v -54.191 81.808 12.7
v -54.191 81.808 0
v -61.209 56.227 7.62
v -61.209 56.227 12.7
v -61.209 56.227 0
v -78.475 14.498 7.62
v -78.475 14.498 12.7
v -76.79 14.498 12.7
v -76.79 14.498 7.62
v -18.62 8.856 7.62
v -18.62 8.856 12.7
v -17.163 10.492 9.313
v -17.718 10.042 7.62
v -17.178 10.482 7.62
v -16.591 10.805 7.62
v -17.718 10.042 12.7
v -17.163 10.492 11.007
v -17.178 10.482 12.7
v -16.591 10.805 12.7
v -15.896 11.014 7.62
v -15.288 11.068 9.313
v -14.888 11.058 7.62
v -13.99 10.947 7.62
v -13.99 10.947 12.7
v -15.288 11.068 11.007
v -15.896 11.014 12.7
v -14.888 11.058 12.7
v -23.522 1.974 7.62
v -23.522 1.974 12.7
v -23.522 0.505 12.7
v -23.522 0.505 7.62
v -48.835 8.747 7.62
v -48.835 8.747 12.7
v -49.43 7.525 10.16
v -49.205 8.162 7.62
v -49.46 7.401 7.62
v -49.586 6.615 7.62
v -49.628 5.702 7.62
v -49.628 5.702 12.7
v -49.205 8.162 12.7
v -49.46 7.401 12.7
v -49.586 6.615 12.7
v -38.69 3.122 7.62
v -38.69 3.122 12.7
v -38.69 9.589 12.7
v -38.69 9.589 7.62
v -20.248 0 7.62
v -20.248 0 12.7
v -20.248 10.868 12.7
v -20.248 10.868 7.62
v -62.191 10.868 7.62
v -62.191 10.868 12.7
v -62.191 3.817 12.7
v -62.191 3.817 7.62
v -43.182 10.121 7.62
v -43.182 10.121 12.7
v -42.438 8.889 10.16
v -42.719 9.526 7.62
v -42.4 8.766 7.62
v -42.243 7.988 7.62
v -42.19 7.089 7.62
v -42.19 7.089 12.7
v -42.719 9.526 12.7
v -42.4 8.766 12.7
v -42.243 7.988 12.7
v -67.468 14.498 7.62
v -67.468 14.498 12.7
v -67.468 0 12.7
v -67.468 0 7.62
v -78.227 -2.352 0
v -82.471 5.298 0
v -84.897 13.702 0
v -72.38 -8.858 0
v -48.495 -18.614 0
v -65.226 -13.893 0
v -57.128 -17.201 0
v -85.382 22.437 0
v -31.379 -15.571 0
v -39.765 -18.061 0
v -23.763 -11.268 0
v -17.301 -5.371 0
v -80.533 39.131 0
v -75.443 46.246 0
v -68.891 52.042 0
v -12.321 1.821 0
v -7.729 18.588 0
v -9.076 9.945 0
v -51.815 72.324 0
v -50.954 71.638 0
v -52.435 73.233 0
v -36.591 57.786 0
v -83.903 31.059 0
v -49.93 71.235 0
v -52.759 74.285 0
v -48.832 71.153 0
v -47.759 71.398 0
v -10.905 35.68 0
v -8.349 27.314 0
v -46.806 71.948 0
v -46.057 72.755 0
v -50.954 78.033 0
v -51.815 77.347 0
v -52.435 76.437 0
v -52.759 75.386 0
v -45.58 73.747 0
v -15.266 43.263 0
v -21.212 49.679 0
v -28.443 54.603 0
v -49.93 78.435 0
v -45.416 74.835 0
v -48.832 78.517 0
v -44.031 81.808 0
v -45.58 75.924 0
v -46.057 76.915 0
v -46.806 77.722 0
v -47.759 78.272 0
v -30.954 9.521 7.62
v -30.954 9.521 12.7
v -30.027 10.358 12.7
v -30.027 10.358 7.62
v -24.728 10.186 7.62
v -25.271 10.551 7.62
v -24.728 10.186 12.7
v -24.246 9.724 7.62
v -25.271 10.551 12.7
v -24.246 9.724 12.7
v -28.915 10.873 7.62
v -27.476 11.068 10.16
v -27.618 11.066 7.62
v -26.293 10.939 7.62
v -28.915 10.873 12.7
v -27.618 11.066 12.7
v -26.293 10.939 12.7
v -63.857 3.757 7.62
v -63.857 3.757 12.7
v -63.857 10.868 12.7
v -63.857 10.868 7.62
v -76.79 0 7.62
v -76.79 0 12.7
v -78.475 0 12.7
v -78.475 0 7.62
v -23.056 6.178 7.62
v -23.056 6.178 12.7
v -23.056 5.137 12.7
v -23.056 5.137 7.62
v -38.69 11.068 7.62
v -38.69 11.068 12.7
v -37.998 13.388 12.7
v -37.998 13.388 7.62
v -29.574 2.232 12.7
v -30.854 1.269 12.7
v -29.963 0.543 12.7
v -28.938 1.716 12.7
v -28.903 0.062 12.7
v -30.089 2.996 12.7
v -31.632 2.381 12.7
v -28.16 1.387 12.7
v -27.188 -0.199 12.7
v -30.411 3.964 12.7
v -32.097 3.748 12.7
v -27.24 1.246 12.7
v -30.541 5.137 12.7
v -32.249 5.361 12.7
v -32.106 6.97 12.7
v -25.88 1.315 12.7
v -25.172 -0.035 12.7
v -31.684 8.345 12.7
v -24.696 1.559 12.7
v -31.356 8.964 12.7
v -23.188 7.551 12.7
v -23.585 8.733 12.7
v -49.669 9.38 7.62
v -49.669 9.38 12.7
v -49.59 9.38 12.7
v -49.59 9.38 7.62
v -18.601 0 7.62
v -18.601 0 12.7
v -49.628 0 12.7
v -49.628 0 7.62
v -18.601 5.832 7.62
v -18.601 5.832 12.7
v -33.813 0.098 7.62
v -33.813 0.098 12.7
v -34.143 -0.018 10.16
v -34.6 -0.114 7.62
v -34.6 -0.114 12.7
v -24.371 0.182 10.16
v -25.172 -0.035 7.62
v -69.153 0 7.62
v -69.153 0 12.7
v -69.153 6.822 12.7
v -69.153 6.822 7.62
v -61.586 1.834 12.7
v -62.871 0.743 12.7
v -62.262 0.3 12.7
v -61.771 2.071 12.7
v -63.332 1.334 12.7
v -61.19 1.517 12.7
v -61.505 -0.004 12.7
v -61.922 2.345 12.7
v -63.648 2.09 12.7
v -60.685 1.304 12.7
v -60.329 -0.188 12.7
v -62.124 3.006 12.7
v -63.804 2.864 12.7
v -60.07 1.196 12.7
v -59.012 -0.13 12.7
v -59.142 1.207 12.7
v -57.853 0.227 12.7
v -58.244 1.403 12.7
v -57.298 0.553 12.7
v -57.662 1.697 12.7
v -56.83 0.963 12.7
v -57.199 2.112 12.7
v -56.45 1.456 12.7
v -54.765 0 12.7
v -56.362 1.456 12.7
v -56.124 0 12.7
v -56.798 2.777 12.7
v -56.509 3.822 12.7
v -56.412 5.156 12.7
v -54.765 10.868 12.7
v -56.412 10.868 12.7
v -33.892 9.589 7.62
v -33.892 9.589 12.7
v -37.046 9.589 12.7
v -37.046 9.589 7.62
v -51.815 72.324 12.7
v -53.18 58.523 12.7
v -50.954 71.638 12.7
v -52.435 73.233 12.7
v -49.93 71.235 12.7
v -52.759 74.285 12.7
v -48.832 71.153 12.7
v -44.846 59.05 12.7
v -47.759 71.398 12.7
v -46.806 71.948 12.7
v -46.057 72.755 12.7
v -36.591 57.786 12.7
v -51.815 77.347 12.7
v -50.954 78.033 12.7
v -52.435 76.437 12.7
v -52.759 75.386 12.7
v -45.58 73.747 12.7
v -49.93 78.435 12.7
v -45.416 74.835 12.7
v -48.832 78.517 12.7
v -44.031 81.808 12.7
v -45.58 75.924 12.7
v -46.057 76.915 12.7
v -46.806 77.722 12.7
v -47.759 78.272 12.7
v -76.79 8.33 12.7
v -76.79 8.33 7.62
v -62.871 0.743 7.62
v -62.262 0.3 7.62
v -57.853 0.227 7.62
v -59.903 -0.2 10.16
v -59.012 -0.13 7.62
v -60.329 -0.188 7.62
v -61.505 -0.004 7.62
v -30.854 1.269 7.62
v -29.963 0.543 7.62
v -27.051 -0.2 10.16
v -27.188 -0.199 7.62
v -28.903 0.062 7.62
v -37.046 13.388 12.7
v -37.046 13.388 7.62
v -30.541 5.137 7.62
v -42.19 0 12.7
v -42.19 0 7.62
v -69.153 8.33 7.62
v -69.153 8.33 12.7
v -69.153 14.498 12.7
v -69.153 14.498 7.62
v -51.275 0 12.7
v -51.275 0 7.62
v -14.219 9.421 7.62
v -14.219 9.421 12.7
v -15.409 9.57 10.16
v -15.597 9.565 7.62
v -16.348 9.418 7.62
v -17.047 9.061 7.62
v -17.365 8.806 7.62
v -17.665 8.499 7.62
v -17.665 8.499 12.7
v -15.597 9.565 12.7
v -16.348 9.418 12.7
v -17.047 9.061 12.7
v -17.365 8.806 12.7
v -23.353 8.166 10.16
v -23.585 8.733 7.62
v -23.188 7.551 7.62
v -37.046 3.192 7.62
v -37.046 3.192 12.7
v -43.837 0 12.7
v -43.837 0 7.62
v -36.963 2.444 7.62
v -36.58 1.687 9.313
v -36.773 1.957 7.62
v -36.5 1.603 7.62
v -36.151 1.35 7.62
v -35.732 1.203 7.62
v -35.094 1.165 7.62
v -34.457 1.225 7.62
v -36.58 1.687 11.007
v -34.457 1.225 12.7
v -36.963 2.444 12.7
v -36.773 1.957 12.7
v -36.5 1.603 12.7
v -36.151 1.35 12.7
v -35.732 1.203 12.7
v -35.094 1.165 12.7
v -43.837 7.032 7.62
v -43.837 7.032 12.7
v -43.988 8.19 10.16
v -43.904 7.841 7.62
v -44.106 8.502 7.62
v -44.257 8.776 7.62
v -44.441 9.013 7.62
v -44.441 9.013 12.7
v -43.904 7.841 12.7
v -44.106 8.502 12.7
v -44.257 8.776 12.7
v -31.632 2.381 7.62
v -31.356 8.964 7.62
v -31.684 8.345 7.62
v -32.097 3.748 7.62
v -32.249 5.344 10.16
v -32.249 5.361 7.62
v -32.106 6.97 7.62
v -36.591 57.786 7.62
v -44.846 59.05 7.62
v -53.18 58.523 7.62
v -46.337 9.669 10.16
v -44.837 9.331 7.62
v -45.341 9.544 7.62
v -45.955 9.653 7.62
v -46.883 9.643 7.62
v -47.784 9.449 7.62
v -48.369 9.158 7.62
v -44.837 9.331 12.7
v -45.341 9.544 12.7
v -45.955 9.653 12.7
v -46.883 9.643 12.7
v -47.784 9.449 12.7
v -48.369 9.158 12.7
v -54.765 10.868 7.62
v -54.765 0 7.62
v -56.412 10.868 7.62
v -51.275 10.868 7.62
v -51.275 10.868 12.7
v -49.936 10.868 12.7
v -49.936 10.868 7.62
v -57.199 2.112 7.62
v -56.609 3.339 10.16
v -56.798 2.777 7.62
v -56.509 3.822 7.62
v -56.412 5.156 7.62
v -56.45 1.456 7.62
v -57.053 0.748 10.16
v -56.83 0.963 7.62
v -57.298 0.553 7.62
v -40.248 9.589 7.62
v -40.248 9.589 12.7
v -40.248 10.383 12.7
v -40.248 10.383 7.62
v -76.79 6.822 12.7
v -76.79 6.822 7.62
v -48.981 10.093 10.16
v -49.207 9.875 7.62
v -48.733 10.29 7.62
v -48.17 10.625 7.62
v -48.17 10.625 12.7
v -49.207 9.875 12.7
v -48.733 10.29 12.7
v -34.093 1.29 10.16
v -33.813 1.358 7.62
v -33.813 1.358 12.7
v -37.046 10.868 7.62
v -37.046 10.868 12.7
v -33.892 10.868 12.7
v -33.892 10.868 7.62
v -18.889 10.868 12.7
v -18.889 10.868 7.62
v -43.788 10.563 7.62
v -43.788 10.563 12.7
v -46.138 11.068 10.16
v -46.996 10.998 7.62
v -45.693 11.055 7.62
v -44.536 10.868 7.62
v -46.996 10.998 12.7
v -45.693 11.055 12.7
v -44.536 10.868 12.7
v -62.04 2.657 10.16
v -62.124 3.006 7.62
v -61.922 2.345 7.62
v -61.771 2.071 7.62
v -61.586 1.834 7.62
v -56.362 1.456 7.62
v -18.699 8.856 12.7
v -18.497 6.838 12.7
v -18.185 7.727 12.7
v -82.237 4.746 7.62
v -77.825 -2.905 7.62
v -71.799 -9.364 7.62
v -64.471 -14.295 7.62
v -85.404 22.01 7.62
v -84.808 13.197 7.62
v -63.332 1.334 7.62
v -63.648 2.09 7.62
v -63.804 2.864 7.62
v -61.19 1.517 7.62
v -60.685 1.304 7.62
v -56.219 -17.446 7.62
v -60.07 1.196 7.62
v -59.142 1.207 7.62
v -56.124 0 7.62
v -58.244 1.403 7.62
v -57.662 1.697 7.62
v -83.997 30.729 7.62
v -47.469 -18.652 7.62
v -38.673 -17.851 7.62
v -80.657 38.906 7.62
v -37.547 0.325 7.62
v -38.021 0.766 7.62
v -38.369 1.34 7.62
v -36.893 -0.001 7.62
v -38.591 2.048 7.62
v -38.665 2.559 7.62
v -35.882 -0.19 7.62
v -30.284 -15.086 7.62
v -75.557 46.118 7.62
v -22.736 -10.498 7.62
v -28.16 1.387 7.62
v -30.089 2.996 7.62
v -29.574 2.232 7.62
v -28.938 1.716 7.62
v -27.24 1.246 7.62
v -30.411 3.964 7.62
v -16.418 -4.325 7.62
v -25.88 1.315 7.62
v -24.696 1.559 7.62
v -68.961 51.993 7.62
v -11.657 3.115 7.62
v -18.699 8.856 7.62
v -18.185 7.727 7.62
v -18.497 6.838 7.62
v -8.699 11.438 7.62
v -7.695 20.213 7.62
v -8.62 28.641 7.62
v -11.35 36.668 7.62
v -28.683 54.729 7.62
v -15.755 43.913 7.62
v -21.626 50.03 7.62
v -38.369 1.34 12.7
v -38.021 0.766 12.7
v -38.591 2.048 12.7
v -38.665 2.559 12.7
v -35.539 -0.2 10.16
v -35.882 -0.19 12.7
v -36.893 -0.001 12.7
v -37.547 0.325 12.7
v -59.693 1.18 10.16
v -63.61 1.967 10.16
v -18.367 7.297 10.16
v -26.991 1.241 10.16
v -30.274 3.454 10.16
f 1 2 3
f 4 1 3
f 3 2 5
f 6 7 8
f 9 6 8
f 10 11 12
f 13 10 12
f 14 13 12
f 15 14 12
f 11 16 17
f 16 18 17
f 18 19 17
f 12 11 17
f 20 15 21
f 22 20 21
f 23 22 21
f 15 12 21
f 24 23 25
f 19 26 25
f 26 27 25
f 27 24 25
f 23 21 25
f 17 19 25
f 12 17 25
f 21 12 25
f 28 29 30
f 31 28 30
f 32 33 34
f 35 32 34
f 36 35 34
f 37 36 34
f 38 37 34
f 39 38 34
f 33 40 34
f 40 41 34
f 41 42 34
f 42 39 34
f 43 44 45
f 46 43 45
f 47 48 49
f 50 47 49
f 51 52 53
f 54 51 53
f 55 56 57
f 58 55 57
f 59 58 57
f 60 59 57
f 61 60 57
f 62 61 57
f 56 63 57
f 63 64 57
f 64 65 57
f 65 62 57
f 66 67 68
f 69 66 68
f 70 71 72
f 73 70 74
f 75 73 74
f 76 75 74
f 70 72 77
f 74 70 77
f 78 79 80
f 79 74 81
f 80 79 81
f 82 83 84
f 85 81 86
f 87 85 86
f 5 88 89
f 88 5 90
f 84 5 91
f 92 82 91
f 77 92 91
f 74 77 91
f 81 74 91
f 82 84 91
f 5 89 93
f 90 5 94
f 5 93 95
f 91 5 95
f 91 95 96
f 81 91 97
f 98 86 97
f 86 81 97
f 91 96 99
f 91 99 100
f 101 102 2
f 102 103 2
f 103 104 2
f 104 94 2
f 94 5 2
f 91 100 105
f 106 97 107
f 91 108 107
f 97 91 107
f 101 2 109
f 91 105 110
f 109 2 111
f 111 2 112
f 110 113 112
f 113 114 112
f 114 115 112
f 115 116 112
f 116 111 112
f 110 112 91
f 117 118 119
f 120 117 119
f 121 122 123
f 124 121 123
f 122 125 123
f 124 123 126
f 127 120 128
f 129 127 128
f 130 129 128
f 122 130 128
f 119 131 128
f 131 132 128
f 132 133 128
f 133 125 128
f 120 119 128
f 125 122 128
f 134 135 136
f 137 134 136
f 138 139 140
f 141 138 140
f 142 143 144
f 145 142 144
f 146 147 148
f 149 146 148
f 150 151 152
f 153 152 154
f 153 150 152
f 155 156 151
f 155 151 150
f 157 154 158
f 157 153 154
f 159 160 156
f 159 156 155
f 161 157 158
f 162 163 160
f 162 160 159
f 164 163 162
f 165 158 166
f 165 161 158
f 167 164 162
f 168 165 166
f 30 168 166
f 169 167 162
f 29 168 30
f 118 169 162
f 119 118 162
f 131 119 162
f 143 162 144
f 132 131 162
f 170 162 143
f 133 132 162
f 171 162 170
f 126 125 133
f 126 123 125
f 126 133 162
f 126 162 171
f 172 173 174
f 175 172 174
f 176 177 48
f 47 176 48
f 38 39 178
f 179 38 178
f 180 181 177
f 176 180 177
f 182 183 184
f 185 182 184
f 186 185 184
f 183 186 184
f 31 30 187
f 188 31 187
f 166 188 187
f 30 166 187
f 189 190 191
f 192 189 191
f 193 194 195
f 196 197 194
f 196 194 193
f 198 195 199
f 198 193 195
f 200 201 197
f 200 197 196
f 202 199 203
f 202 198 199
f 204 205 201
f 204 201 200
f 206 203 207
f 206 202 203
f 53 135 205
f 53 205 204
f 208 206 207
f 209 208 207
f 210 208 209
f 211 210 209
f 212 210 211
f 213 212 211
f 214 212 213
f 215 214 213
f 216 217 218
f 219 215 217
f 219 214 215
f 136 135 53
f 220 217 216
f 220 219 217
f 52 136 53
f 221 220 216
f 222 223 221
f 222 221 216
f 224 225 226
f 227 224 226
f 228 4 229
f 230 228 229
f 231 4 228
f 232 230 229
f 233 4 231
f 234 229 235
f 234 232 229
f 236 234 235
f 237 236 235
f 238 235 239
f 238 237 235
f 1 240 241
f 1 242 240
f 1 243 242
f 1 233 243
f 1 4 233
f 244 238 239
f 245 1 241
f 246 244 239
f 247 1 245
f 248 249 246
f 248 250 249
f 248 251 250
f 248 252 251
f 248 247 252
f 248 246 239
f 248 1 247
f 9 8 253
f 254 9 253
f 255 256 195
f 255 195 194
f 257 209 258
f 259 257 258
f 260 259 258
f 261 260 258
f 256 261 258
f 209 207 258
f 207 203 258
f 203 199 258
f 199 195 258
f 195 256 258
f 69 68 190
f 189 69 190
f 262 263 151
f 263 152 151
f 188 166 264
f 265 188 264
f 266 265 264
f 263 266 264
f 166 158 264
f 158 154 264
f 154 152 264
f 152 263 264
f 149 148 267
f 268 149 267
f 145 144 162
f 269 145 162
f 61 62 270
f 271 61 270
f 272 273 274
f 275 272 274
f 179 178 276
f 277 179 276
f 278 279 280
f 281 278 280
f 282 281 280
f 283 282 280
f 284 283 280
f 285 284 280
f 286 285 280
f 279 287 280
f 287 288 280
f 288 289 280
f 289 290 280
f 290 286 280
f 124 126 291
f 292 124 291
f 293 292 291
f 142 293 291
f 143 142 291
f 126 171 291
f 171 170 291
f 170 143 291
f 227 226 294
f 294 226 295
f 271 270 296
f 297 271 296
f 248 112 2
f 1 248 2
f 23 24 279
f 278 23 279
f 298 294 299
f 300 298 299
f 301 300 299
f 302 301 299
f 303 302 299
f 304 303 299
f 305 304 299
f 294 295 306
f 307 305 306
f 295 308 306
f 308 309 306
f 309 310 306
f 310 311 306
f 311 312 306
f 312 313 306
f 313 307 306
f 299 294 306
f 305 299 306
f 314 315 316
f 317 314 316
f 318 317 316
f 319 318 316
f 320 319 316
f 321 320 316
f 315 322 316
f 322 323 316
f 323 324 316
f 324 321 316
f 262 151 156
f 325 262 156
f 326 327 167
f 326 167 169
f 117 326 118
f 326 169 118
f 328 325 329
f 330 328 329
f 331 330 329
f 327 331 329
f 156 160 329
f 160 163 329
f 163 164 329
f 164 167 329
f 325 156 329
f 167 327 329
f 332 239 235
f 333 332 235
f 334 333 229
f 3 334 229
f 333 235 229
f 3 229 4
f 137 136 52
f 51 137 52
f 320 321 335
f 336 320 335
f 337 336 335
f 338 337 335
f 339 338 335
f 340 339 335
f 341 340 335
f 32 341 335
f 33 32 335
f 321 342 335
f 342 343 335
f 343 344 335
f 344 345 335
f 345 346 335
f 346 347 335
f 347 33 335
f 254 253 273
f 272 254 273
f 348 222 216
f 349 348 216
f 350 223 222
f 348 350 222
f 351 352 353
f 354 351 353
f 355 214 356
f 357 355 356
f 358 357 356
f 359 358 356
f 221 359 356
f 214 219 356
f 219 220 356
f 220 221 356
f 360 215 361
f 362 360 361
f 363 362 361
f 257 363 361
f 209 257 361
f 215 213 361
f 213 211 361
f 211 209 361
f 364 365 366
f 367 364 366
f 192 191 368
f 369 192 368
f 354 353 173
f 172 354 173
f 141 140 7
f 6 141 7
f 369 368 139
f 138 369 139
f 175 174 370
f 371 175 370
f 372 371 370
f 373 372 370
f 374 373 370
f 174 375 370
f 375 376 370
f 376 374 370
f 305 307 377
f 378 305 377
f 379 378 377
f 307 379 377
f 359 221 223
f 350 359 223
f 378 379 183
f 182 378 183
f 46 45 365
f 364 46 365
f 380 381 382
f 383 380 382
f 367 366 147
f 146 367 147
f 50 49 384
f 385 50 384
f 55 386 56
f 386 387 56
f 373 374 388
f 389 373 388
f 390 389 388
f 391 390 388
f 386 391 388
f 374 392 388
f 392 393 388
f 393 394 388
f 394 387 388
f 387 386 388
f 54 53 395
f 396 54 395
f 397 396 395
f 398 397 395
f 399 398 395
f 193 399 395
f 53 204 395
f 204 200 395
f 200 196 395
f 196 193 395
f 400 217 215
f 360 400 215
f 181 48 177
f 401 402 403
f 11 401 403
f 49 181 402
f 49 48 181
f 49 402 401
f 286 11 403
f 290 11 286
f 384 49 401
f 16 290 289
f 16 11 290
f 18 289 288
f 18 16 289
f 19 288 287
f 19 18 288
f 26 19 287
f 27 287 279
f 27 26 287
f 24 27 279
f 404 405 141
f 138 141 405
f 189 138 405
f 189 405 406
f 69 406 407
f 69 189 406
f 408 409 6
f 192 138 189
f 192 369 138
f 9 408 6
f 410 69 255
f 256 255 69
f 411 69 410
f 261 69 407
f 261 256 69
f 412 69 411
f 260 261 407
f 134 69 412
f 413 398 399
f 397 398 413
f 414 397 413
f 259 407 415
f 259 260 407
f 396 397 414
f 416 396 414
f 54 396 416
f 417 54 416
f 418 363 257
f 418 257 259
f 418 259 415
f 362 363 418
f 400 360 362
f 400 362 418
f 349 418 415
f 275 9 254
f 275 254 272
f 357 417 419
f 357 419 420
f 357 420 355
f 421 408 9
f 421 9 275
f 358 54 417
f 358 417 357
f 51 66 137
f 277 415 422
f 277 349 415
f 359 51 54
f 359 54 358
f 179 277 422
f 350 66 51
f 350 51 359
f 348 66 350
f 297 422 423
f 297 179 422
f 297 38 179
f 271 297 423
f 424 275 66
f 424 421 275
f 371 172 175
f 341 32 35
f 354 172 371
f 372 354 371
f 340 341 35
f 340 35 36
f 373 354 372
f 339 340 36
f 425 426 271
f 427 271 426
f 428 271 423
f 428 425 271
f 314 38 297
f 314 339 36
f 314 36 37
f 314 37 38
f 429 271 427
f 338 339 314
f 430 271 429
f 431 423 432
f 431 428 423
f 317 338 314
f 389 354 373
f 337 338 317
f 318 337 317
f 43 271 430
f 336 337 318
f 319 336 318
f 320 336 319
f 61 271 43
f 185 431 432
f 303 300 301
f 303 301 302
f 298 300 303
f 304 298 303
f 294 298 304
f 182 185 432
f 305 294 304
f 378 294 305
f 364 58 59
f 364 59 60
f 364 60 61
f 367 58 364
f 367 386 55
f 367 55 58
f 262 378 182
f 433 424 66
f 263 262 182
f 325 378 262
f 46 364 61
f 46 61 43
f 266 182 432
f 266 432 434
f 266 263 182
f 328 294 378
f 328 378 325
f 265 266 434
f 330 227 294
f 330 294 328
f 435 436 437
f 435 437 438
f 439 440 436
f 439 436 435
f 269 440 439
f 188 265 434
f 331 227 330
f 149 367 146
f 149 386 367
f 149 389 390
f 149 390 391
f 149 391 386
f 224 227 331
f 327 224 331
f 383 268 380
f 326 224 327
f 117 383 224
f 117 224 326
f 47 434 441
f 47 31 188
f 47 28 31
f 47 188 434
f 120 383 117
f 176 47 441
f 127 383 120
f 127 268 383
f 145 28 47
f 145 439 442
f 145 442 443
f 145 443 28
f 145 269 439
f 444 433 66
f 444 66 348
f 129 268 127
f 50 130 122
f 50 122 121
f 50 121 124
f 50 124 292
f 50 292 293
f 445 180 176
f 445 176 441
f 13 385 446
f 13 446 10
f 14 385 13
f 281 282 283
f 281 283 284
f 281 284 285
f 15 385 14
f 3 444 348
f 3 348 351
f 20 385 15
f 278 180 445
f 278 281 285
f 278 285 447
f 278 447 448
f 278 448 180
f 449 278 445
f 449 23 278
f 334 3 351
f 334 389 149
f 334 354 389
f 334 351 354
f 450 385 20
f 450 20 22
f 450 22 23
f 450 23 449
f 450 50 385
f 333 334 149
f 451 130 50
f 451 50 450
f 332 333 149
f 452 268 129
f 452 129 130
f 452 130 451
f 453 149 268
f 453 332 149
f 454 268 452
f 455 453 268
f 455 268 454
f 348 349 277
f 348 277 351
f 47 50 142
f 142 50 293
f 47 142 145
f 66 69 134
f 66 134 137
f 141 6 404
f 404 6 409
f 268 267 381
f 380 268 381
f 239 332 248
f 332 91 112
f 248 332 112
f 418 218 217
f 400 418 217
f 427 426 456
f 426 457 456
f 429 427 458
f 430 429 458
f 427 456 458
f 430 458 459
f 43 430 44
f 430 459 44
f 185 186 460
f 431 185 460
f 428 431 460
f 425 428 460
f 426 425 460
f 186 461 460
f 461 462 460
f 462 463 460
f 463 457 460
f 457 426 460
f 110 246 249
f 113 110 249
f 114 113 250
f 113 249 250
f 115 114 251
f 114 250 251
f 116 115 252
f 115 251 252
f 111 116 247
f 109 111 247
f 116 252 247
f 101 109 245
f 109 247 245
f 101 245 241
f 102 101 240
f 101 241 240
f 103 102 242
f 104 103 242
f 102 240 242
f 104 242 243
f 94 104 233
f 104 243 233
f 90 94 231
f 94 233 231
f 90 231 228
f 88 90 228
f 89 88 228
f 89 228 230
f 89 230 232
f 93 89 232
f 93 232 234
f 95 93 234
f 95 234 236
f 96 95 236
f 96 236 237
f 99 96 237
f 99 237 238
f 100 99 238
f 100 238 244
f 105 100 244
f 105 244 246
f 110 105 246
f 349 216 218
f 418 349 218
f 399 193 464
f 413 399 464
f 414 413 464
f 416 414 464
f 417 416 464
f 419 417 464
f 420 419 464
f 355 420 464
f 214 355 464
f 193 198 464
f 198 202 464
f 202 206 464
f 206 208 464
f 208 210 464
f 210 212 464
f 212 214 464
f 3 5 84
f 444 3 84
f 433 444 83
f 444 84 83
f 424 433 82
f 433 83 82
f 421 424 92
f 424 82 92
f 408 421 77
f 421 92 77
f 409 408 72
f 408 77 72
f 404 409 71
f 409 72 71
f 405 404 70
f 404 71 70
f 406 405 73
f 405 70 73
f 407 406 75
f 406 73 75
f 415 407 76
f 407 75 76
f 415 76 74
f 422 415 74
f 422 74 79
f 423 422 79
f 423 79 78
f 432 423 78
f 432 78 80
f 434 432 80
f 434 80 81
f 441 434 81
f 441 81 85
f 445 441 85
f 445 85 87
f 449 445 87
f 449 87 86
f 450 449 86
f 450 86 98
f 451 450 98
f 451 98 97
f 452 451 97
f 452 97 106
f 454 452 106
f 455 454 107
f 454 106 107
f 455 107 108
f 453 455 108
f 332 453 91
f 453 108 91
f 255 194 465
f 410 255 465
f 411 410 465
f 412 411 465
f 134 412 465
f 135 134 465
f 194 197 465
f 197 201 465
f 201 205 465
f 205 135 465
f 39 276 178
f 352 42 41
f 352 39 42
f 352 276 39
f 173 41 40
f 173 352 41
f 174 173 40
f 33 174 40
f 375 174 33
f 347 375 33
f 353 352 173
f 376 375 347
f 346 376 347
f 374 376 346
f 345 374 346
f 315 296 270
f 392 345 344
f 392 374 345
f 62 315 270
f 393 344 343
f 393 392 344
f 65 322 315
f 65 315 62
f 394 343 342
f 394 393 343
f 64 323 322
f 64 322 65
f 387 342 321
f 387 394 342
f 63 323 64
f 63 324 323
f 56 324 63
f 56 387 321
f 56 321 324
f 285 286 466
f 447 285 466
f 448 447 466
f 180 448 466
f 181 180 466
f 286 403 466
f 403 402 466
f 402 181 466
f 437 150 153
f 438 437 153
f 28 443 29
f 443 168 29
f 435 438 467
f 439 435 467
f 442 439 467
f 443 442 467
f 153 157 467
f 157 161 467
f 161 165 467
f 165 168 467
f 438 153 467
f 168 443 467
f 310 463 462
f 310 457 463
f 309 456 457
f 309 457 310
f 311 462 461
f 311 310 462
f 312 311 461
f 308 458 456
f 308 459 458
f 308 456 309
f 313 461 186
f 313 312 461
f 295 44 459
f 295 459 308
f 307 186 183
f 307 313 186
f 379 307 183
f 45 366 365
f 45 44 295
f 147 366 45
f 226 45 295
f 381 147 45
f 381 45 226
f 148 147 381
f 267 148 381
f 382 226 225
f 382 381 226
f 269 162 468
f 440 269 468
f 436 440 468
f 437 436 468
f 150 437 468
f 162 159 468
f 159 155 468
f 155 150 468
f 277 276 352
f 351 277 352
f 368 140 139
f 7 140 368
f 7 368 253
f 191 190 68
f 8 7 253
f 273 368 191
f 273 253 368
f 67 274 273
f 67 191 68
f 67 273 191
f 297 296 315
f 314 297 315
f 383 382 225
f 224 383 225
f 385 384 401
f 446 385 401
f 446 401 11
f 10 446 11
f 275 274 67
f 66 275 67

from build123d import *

# Parameters (mm, degrees)
F1_DEPTH = 12.7
F3_DEPTH = 5.08
F2_R     = 3.6923904974
F4_DEPTH = 12.701


with BuildPart() as f1:
    # F0 (on Top) → F1 (new body)
    with BuildSketch(Plane.XY):
        with BuildLine():
            Line((-54.1907071126, 81.808431102), (-61.2093408165, 56.2272694019))
            ThreePointArc((-61.2093408165, 56.2272694019), (-44.1142917545, -18.5841968693), (-36.5910920494, 57.7859390103))
            Line((-36.5910920494, 57.7859390103), (-44.0307071126, 81.808431102))
            Line((-44.0307071126, 81.808431102), (-54.1907071126, 81.808431102))
        make_face()
    extrude(amount=F1_DEPTH)

    # F2 (on face) → F3 (cut)
    with BuildSketch(Plane.XY.offset(12.7)):
        with BuildLine():
            ThreePointArc((-61.2093408165, 56.2272694019), (-68.2756243995, -12.0384858735), (-7.695419858, 20.2134059267))
            ThreePointArc((-7.695419858, 20.2134059267), (-15.7547342949, 43.9128527226), (-36.5910920494, 57.7859390103))
            ThreePointArc((-36.5910920494, 57.7859390103), (-49.0271224706, 59.0110087227), (-61.2093408165, 56.2272694019))
        make_face()
        with BuildLine():
            Line((-63.8565910506, 10.8681354841), (-62.1906724727, 10.8681354841))
            Line((-62.1906724727, 10.8681354841), (-62.1906724727, 3.817333427))
            add(Edge.make_bspline(
                [(-62.1906724727, 3.817333427), (-62.1906724727, 2.4877717429), (-61.5861820173, 1.8340970248)],
                knots=[0, 0, 0, 1, 1, 1], degree=2))
            add(Edge.make_bspline(
                [(-61.5861820173, 1.8340970248), (-60.9816915619, 1.1804223066), (-59.693381195, 1.1804223066)],
                knots=[0, 0, 0, 1, 1, 1], degree=2))
            add(Edge.make_bspline(
                [(-59.693381195, 1.1804223066), (-57.9862113, 1.1804223066), (-57.1992630956, 2.1117501211)],
                knots=[0, 0, 0, 1, 1, 1], degree=2))
            add(Edge.make_bspline(
                [(-57.1992630956, 2.1117501211), (-56.4123148912, 3.0430779355), (-56.4123148912, 5.1564146457)],
                knots=[0, 0, 0, 1, 1, 1], degree=2))
            Line((-56.4123148912, 5.1564146457), (-56.4123148912, 10.8681354841))
            Line((-56.4123148912, 10.8681354841), (-54.7654353828, 10.8681354841))
            Line((-54.7654353828, 10.8681354841), (-54.7654353828, 0))
            Line((-54.7654353828, 0), (-56.1235556711, 0))
            Line((-56.1235556711, 0), (-56.3615440393, 1.4564888138))
            Line((-56.3615440393, 1.4564888138), (-56.4503930302, 1.4564888138))
            add(Edge.make_bspline(
                [(-56.4503930302, 1.4564888138), (-56.9549283709, 0.6536747182), (-57.8529378138, 0.2268822444)],
                knots=[0, 0, 0, 1, 1, 1], degree=2))
            add(Edge.make_bspline(
                [(-57.8529378138, 0.2268822444), (-58.7509472567, -0.1999102293), (-59.9028109591, -0.1999102293)],
                knots=[0, 0, 0, 1, 1, 1], degree=2))
            add(Edge.make_bspline(
                [(-59.9028109591, -0.1999102293), (-61.8860473613, -0.1999102293), (-62.8713192059, 0.742523709)],
                knots=[0, 0, 0, 1, 1, 1], degree=2))
            add(Edge.make_bspline(
                [(-62.8713192059, 0.742523709), (-63.8565910506, 1.6849576473), (-63.8565910506, 3.7570430403)],
                knots=[0, 0, 0, 1, 1, 1], degree=2))
            Line((-63.8565910506, 3.7570430403), (-63.8565910506, 10.8681354841))
        make_face(mode=Mode.SUBTRACT)
        with BuildLine():
            Line((-42.1901300037, 0), (-43.8370095121, 0))
            Line((-43.8370095121, 0), (-43.8370095121, 7.0317629877))
            add(Edge.make_bspline(
                [(-43.8370095121, 7.0317629877), (-43.8370095121, 8.3581514935), (-44.4414999675, 9.0134128008)],
                knots=[0, 0, 0, 1, 1, 1], degree=2))
            add(Edge.make_bspline(
                [(-44.4414999675, 9.0134128008), (-45.0459904229, 9.668674108), (-46.337473968, 9.668674108)],
                knots=[0, 0, 0, 1, 1, 1], degree=2))
            add(Edge.make_bspline(
                [(-46.337473968, 9.668674108), (-48.0414706848, 9.668674108), (-48.8347652457, 8.7468658283)],
                knots=[0, 0, 0, 1, 1, 1], degree=2))
            add(Edge.make_bspline(
                [(-48.8347652457, 8.7468658283), (-49.6280598066, 7.8250575485), (-49.6280598066, 5.7022013036)],
                knots=[0, 0, 0, 1, 1, 1], degree=2))
            Line((-49.6280598066, 5.7022013036), (-49.6280598066, 0))
            Line((-49.6280598066, 0), (-51.274939315, 0))
            Line((-51.274939315, 0), (-51.274939315, 10.8681354841))
            Line((-51.274939315, 10.8681354841), (-49.9358580962, 10.8681354841))
            Line((-49.9358580962, 10.8681354841), (-49.6693111237, 9.3799148879))
            Line((-49.6693111237, 9.3799148879), (-49.5899816676, 9.3799148879))
            add(Edge.make_bspline(
                [(-49.5899816676, 9.3799148879), (-49.0822731487, 10.1827289835), (-48.1699844037, 10.6253873485)],
                knots=[0, 0, 0, 1, 1, 1], degree=2))
            add(Edge.make_bspline(
                [(-48.1699844037, 10.6253873485), (-47.2576956586, 11.0680457134), (-46.1375637387, 11.0680457134)],
                knots=[0, 0, 0, 1, 1, 1], degree=2))
            add(Edge.make_bspline(
                [(-46.1375637387, 11.0680457134), (-44.1733664059, 11.0680457134), (-43.1817482048, 10.1208520077)],
                knots=[0, 0, 0, 1, 1, 1], degree=2))
            add(Edge.make_bspline(
                [(-43.1817482048, 10.1208520077), (-42.1901300037, 9.1736583021), (-42.1901300037, 7.0888801961)],
                knots=[0, 0, 0, 1, 1, 1], degree=2))
            Line((-42.1901300037, 7.0888801961), (-42.1901300037, 0))
        make_face(mode=Mode.SUBTRACT)
        Polygon((-67.4676678917, 14.4982513947), (-67.4676678917, 0), (-69.152625539, 0), (-69.152625539, 6.8223332236), (-76.7904655712, 6.8223332236), (-76.7904655712, 0), (-78.4754232185, 0), (-78.4754232185, 14.4982513947), (-76.7904655712, 14.4982513947), (-76.7904655712, 8.3295928893), (-69.152625539, 8.3295928893), (-69.152625539, 14.4982513947), align=None, mode=Mode.SUBTRACT)
        with BuildLine():
            add(Edge.make_bspline(
                [(-25.1723750837, -0.0349049607), (-25.9498037533, -0.1999102293), (-27.0508966038, -0.1999102293)],
                knots=[0, 0, 0, 1, 1, 1], degree=2))
            add(Edge.make_bspline(
                [(-27.0508966038, -0.1999102293), (-29.4593388907, -0.1999102293), (-30.8539507287, 1.2692712974)],
                knots=[0, 0, 0, 1, 1, 1], degree=2))
            add(Edge.make_bspline(
                [(-30.8539507287, 1.2692712974), (-32.2485625667, 2.7384528242), (-32.2485625667, 5.3436321621)],
                knots=[0, 0, 0, 1, 1, 1], degree=2))
            add(Edge.make_bspline(
                [(-32.2485625667, 5.3436321621), (-32.2485625667, 7.974196926), (-30.9539058434, 9.5211213197)],
                knots=[0, 0, 0, 1, 1, 1], degree=2))
            add(Edge.make_bspline(
                [(-30.9539058434, 9.5211213197), (-29.65924912, 11.0680457134), (-27.4761024885, 11.0680457134)],
                knots=[0, 0, 0, 1, 1, 1], degree=2))
            add(Edge.make_bspline(
                [(-27.4761024885, 11.0680457134), (-25.4357488779, 11.0680457134), (-24.2458070366, 9.7242047273)],
                knots=[0, 0, 0, 1, 1, 1], degree=2))
            add(Edge.make_bspline(
                [(-24.2458070366, 9.7242047273), (-23.0558651952, 8.3803637412), (-23.0558651952, 6.1781780402)],
                knots=[0, 0, 0, 1, 1, 1], degree=2))
            Line((-23.0558651952, 6.1781780402), (-23.0558651952, 5.1373755763))
            Line((-23.0558651952, 5.1373755763), (-30.5413926717, 5.1373755763))
            add(Edge.make_bspline(
                [(-30.5413926717, 5.1373755763), (-30.4906218198, 3.2239490954), (-29.5735733074, 2.2323308943)],
                knots=[0, 0, 0, 1, 1, 1], degree=2))
            add(Edge.make_bspline(
                [(-29.5735733074, 2.2323308943), (-28.6565247951, 1.2407126932), (-26.9906062172, 1.2407126932)],
                knots=[0, 0, 0, 1, 1, 1], degree=2))
            add(Edge.make_bspline(
                [(-26.9906062172, 1.2407126932), (-25.2358386485, 1.2407126932), (-23.522322397, 1.9737168675)],
                knots=[0, 0, 0, 1, 1, 1], degree=2))
            Line((-23.522322397, 1.9737168675), (-23.522322397, 0.5045353407))
            add(Edge.make_bspline(
                [(-23.522322397, 0.5045353407), (-24.394946414, 0.130100308), (-25.1723750837, -0.0349049607)],
                knots=[0, 0, 0, 1, 1, 1], degree=2))
        make_face(mode=Mode.SUBTRACT)
        with BuildLine():
            add(Edge.make_bspline(
                [(-17.163273197, 10.4921138622), (-16.3096882495, 11.0680457134), (-15.2879248551, 11.0680457134)],
                knots=[0, 0, 0, 1, 1, 1], degree=2))
            add(Edge.make_bspline(
                [(-15.2879248551, 11.0680457134), (-14.5644402155, 11.0680457134), (-13.9900949535, 10.9474649402)],
                knots=[0, 0, 0, 1, 1, 1], degree=2))
            Line((-13.9900949535, 10.9474649402), (-14.218563787, 9.421166205))
            add(Edge.make_bspline(
                [(-14.218563787, 9.421166205), (-14.8912775746, 9.5703055825), (-15.4085056283, 9.5703055825)],
                knots=[0, 0, 0, 1, 1, 1], degree=2))
            add(Edge.make_bspline(
                [(-15.4085056283, 9.5703055825), (-16.7285477776, 9.5703055825), (-17.6646353595, 8.4993579253)],
                knots=[0, 0, 0, 1, 1, 1], degree=2))
            add(Edge.make_bspline(
                [(-17.6646353595, 8.4993579253), (-18.6007229413, 7.4284102681), (-18.6007229413, 5.8323016116)],
                knots=[0, 0, 0, 1, 1, 1], degree=2))
            Line((-18.6007229413, 5.8323016116), (-18.6007229413, 0))
            Line((-18.6007229413, 0), (-20.2476024497, 0))
            Line((-20.2476024497, 0), (-20.2476024497, 10.8681354841))
            Line((-20.2476024497, 10.8681354841), (-18.8894821615, 10.8681354841))
            Line((-18.8894821615, 10.8681354841), (-18.6990914669, 8.8563404777))
            Line((-18.6990914669, 8.8563404777), (-18.6197620108, 8.8563404777))
            add(Edge.make_bspline(
                [(-18.6197620108, 8.8563404777), (-18.0168581445, 9.916182011), (-17.163273197, 10.4921138622)],
                knots=[0, 0, 0, 1, 1, 1], degree=2))
        make_face(mode=Mode.SUBTRACT)
        with BuildLine():
            add(Edge.make_bspline(
                [(-36.5799508692, 1.6865442364), (-36.1134936674, 1.1613832371), (-35.301160037, 1.1613832371)],
                knots=[0, 0, 0, 1, 1, 1], degree=2))
            add(Edge.make_bspline(
                [(-35.301160037, 1.1613832371), (-34.8632614394, 1.1613832371), (-34.4570946242, 1.224846802)],
                knots=[0, 0, 0, 1, 1, 1], degree=2))
            add(Edge.make_bspline(
                [(-34.4570946242, 1.224846802), (-34.0509278091, 1.2883103669), (-33.8129394408, 1.3581202882)],
                knots=[0, 0, 0, 1, 1, 1], degree=2))
            Line((-33.8129394408, 1.3581202882), (-33.8129394408, 0.0983685256))
            add(Edge.make_bspline(
                [(-33.8129394408, 0.0983685256), (-34.0794864133, -0.0285586042), (-34.5998876452, -0.1142344168)],
                knots=[0, 0, 0, 1, 1, 1], degree=2))
            add(Edge.make_bspline(
                [(-34.5998876452, -0.1142344168), (-35.1202888771, -0.1999102293), (-35.5391484053, -0.1999102293)],
                knots=[0, 0, 0, 1, 1, 1], degree=2))
            add(Edge.make_bspline(
                [(-35.5391484053, -0.1999102293), (-38.6901144011, -0.1999102293), (-38.6901144011, 3.1224073916)],
                knots=[0, 0, 0, 1, 1, 1], degree=2))
            Line((-38.6901144011, 3.1224073916), (-38.6901144011, 9.589344652))
            Line((-38.6901144011, 9.589344652), (-40.2481449187, 9.589344652))
            Line((-40.2481449187, 9.589344652), (-40.2481449187, 10.3826392128))
            Line((-40.2481449187, 10.3826392128), (-38.6901144011, 11.0680457134))
            Line((-38.6901144011, 11.0680457134), (-37.998361544, 13.3876390095))
            Line((-37.998361544, 13.3876390095), (-37.046408071, 13.3876390095))
            Line((-37.046408071, 13.3876390095), (-37.046408071, 10.8681354841))
            Line((-37.046408071, 10.8681354841), (-33.8922688969, 10.8681354841))
            Line((-33.8922688969, 10.8681354841), (-33.8922688969, 9.589344652))
            Line((-33.8922688969, 9.589344652), (-37.046408071, 9.589344652))
            Line((-37.046408071, 9.589344652), (-37.046408071, 3.192217313))
            add(Edge.make_bspline(
                [(-37.046408071, 3.192217313), (-37.046408071, 2.2117052357), (-36.5799508692, 1.6865442364)],
                knots=[0, 0, 0, 1, 1, 1], degree=2))
        make_face(mode=Mode.SUBTRACT)
    extrude(amount=-F3_DEPTH, mode=Mode.SUBTRACT)

    # F2 (on face) → F4 (cut, through all)
    with BuildSketch(Plane.XY.offset(12.7)):
        with Locations((-49.1080991924, 74.8352557421)):
            Circle(F2_R)
    extrude(amount=-F4_DEPTH, mode=Mode.SUBTRACT)


solid = f1.part
